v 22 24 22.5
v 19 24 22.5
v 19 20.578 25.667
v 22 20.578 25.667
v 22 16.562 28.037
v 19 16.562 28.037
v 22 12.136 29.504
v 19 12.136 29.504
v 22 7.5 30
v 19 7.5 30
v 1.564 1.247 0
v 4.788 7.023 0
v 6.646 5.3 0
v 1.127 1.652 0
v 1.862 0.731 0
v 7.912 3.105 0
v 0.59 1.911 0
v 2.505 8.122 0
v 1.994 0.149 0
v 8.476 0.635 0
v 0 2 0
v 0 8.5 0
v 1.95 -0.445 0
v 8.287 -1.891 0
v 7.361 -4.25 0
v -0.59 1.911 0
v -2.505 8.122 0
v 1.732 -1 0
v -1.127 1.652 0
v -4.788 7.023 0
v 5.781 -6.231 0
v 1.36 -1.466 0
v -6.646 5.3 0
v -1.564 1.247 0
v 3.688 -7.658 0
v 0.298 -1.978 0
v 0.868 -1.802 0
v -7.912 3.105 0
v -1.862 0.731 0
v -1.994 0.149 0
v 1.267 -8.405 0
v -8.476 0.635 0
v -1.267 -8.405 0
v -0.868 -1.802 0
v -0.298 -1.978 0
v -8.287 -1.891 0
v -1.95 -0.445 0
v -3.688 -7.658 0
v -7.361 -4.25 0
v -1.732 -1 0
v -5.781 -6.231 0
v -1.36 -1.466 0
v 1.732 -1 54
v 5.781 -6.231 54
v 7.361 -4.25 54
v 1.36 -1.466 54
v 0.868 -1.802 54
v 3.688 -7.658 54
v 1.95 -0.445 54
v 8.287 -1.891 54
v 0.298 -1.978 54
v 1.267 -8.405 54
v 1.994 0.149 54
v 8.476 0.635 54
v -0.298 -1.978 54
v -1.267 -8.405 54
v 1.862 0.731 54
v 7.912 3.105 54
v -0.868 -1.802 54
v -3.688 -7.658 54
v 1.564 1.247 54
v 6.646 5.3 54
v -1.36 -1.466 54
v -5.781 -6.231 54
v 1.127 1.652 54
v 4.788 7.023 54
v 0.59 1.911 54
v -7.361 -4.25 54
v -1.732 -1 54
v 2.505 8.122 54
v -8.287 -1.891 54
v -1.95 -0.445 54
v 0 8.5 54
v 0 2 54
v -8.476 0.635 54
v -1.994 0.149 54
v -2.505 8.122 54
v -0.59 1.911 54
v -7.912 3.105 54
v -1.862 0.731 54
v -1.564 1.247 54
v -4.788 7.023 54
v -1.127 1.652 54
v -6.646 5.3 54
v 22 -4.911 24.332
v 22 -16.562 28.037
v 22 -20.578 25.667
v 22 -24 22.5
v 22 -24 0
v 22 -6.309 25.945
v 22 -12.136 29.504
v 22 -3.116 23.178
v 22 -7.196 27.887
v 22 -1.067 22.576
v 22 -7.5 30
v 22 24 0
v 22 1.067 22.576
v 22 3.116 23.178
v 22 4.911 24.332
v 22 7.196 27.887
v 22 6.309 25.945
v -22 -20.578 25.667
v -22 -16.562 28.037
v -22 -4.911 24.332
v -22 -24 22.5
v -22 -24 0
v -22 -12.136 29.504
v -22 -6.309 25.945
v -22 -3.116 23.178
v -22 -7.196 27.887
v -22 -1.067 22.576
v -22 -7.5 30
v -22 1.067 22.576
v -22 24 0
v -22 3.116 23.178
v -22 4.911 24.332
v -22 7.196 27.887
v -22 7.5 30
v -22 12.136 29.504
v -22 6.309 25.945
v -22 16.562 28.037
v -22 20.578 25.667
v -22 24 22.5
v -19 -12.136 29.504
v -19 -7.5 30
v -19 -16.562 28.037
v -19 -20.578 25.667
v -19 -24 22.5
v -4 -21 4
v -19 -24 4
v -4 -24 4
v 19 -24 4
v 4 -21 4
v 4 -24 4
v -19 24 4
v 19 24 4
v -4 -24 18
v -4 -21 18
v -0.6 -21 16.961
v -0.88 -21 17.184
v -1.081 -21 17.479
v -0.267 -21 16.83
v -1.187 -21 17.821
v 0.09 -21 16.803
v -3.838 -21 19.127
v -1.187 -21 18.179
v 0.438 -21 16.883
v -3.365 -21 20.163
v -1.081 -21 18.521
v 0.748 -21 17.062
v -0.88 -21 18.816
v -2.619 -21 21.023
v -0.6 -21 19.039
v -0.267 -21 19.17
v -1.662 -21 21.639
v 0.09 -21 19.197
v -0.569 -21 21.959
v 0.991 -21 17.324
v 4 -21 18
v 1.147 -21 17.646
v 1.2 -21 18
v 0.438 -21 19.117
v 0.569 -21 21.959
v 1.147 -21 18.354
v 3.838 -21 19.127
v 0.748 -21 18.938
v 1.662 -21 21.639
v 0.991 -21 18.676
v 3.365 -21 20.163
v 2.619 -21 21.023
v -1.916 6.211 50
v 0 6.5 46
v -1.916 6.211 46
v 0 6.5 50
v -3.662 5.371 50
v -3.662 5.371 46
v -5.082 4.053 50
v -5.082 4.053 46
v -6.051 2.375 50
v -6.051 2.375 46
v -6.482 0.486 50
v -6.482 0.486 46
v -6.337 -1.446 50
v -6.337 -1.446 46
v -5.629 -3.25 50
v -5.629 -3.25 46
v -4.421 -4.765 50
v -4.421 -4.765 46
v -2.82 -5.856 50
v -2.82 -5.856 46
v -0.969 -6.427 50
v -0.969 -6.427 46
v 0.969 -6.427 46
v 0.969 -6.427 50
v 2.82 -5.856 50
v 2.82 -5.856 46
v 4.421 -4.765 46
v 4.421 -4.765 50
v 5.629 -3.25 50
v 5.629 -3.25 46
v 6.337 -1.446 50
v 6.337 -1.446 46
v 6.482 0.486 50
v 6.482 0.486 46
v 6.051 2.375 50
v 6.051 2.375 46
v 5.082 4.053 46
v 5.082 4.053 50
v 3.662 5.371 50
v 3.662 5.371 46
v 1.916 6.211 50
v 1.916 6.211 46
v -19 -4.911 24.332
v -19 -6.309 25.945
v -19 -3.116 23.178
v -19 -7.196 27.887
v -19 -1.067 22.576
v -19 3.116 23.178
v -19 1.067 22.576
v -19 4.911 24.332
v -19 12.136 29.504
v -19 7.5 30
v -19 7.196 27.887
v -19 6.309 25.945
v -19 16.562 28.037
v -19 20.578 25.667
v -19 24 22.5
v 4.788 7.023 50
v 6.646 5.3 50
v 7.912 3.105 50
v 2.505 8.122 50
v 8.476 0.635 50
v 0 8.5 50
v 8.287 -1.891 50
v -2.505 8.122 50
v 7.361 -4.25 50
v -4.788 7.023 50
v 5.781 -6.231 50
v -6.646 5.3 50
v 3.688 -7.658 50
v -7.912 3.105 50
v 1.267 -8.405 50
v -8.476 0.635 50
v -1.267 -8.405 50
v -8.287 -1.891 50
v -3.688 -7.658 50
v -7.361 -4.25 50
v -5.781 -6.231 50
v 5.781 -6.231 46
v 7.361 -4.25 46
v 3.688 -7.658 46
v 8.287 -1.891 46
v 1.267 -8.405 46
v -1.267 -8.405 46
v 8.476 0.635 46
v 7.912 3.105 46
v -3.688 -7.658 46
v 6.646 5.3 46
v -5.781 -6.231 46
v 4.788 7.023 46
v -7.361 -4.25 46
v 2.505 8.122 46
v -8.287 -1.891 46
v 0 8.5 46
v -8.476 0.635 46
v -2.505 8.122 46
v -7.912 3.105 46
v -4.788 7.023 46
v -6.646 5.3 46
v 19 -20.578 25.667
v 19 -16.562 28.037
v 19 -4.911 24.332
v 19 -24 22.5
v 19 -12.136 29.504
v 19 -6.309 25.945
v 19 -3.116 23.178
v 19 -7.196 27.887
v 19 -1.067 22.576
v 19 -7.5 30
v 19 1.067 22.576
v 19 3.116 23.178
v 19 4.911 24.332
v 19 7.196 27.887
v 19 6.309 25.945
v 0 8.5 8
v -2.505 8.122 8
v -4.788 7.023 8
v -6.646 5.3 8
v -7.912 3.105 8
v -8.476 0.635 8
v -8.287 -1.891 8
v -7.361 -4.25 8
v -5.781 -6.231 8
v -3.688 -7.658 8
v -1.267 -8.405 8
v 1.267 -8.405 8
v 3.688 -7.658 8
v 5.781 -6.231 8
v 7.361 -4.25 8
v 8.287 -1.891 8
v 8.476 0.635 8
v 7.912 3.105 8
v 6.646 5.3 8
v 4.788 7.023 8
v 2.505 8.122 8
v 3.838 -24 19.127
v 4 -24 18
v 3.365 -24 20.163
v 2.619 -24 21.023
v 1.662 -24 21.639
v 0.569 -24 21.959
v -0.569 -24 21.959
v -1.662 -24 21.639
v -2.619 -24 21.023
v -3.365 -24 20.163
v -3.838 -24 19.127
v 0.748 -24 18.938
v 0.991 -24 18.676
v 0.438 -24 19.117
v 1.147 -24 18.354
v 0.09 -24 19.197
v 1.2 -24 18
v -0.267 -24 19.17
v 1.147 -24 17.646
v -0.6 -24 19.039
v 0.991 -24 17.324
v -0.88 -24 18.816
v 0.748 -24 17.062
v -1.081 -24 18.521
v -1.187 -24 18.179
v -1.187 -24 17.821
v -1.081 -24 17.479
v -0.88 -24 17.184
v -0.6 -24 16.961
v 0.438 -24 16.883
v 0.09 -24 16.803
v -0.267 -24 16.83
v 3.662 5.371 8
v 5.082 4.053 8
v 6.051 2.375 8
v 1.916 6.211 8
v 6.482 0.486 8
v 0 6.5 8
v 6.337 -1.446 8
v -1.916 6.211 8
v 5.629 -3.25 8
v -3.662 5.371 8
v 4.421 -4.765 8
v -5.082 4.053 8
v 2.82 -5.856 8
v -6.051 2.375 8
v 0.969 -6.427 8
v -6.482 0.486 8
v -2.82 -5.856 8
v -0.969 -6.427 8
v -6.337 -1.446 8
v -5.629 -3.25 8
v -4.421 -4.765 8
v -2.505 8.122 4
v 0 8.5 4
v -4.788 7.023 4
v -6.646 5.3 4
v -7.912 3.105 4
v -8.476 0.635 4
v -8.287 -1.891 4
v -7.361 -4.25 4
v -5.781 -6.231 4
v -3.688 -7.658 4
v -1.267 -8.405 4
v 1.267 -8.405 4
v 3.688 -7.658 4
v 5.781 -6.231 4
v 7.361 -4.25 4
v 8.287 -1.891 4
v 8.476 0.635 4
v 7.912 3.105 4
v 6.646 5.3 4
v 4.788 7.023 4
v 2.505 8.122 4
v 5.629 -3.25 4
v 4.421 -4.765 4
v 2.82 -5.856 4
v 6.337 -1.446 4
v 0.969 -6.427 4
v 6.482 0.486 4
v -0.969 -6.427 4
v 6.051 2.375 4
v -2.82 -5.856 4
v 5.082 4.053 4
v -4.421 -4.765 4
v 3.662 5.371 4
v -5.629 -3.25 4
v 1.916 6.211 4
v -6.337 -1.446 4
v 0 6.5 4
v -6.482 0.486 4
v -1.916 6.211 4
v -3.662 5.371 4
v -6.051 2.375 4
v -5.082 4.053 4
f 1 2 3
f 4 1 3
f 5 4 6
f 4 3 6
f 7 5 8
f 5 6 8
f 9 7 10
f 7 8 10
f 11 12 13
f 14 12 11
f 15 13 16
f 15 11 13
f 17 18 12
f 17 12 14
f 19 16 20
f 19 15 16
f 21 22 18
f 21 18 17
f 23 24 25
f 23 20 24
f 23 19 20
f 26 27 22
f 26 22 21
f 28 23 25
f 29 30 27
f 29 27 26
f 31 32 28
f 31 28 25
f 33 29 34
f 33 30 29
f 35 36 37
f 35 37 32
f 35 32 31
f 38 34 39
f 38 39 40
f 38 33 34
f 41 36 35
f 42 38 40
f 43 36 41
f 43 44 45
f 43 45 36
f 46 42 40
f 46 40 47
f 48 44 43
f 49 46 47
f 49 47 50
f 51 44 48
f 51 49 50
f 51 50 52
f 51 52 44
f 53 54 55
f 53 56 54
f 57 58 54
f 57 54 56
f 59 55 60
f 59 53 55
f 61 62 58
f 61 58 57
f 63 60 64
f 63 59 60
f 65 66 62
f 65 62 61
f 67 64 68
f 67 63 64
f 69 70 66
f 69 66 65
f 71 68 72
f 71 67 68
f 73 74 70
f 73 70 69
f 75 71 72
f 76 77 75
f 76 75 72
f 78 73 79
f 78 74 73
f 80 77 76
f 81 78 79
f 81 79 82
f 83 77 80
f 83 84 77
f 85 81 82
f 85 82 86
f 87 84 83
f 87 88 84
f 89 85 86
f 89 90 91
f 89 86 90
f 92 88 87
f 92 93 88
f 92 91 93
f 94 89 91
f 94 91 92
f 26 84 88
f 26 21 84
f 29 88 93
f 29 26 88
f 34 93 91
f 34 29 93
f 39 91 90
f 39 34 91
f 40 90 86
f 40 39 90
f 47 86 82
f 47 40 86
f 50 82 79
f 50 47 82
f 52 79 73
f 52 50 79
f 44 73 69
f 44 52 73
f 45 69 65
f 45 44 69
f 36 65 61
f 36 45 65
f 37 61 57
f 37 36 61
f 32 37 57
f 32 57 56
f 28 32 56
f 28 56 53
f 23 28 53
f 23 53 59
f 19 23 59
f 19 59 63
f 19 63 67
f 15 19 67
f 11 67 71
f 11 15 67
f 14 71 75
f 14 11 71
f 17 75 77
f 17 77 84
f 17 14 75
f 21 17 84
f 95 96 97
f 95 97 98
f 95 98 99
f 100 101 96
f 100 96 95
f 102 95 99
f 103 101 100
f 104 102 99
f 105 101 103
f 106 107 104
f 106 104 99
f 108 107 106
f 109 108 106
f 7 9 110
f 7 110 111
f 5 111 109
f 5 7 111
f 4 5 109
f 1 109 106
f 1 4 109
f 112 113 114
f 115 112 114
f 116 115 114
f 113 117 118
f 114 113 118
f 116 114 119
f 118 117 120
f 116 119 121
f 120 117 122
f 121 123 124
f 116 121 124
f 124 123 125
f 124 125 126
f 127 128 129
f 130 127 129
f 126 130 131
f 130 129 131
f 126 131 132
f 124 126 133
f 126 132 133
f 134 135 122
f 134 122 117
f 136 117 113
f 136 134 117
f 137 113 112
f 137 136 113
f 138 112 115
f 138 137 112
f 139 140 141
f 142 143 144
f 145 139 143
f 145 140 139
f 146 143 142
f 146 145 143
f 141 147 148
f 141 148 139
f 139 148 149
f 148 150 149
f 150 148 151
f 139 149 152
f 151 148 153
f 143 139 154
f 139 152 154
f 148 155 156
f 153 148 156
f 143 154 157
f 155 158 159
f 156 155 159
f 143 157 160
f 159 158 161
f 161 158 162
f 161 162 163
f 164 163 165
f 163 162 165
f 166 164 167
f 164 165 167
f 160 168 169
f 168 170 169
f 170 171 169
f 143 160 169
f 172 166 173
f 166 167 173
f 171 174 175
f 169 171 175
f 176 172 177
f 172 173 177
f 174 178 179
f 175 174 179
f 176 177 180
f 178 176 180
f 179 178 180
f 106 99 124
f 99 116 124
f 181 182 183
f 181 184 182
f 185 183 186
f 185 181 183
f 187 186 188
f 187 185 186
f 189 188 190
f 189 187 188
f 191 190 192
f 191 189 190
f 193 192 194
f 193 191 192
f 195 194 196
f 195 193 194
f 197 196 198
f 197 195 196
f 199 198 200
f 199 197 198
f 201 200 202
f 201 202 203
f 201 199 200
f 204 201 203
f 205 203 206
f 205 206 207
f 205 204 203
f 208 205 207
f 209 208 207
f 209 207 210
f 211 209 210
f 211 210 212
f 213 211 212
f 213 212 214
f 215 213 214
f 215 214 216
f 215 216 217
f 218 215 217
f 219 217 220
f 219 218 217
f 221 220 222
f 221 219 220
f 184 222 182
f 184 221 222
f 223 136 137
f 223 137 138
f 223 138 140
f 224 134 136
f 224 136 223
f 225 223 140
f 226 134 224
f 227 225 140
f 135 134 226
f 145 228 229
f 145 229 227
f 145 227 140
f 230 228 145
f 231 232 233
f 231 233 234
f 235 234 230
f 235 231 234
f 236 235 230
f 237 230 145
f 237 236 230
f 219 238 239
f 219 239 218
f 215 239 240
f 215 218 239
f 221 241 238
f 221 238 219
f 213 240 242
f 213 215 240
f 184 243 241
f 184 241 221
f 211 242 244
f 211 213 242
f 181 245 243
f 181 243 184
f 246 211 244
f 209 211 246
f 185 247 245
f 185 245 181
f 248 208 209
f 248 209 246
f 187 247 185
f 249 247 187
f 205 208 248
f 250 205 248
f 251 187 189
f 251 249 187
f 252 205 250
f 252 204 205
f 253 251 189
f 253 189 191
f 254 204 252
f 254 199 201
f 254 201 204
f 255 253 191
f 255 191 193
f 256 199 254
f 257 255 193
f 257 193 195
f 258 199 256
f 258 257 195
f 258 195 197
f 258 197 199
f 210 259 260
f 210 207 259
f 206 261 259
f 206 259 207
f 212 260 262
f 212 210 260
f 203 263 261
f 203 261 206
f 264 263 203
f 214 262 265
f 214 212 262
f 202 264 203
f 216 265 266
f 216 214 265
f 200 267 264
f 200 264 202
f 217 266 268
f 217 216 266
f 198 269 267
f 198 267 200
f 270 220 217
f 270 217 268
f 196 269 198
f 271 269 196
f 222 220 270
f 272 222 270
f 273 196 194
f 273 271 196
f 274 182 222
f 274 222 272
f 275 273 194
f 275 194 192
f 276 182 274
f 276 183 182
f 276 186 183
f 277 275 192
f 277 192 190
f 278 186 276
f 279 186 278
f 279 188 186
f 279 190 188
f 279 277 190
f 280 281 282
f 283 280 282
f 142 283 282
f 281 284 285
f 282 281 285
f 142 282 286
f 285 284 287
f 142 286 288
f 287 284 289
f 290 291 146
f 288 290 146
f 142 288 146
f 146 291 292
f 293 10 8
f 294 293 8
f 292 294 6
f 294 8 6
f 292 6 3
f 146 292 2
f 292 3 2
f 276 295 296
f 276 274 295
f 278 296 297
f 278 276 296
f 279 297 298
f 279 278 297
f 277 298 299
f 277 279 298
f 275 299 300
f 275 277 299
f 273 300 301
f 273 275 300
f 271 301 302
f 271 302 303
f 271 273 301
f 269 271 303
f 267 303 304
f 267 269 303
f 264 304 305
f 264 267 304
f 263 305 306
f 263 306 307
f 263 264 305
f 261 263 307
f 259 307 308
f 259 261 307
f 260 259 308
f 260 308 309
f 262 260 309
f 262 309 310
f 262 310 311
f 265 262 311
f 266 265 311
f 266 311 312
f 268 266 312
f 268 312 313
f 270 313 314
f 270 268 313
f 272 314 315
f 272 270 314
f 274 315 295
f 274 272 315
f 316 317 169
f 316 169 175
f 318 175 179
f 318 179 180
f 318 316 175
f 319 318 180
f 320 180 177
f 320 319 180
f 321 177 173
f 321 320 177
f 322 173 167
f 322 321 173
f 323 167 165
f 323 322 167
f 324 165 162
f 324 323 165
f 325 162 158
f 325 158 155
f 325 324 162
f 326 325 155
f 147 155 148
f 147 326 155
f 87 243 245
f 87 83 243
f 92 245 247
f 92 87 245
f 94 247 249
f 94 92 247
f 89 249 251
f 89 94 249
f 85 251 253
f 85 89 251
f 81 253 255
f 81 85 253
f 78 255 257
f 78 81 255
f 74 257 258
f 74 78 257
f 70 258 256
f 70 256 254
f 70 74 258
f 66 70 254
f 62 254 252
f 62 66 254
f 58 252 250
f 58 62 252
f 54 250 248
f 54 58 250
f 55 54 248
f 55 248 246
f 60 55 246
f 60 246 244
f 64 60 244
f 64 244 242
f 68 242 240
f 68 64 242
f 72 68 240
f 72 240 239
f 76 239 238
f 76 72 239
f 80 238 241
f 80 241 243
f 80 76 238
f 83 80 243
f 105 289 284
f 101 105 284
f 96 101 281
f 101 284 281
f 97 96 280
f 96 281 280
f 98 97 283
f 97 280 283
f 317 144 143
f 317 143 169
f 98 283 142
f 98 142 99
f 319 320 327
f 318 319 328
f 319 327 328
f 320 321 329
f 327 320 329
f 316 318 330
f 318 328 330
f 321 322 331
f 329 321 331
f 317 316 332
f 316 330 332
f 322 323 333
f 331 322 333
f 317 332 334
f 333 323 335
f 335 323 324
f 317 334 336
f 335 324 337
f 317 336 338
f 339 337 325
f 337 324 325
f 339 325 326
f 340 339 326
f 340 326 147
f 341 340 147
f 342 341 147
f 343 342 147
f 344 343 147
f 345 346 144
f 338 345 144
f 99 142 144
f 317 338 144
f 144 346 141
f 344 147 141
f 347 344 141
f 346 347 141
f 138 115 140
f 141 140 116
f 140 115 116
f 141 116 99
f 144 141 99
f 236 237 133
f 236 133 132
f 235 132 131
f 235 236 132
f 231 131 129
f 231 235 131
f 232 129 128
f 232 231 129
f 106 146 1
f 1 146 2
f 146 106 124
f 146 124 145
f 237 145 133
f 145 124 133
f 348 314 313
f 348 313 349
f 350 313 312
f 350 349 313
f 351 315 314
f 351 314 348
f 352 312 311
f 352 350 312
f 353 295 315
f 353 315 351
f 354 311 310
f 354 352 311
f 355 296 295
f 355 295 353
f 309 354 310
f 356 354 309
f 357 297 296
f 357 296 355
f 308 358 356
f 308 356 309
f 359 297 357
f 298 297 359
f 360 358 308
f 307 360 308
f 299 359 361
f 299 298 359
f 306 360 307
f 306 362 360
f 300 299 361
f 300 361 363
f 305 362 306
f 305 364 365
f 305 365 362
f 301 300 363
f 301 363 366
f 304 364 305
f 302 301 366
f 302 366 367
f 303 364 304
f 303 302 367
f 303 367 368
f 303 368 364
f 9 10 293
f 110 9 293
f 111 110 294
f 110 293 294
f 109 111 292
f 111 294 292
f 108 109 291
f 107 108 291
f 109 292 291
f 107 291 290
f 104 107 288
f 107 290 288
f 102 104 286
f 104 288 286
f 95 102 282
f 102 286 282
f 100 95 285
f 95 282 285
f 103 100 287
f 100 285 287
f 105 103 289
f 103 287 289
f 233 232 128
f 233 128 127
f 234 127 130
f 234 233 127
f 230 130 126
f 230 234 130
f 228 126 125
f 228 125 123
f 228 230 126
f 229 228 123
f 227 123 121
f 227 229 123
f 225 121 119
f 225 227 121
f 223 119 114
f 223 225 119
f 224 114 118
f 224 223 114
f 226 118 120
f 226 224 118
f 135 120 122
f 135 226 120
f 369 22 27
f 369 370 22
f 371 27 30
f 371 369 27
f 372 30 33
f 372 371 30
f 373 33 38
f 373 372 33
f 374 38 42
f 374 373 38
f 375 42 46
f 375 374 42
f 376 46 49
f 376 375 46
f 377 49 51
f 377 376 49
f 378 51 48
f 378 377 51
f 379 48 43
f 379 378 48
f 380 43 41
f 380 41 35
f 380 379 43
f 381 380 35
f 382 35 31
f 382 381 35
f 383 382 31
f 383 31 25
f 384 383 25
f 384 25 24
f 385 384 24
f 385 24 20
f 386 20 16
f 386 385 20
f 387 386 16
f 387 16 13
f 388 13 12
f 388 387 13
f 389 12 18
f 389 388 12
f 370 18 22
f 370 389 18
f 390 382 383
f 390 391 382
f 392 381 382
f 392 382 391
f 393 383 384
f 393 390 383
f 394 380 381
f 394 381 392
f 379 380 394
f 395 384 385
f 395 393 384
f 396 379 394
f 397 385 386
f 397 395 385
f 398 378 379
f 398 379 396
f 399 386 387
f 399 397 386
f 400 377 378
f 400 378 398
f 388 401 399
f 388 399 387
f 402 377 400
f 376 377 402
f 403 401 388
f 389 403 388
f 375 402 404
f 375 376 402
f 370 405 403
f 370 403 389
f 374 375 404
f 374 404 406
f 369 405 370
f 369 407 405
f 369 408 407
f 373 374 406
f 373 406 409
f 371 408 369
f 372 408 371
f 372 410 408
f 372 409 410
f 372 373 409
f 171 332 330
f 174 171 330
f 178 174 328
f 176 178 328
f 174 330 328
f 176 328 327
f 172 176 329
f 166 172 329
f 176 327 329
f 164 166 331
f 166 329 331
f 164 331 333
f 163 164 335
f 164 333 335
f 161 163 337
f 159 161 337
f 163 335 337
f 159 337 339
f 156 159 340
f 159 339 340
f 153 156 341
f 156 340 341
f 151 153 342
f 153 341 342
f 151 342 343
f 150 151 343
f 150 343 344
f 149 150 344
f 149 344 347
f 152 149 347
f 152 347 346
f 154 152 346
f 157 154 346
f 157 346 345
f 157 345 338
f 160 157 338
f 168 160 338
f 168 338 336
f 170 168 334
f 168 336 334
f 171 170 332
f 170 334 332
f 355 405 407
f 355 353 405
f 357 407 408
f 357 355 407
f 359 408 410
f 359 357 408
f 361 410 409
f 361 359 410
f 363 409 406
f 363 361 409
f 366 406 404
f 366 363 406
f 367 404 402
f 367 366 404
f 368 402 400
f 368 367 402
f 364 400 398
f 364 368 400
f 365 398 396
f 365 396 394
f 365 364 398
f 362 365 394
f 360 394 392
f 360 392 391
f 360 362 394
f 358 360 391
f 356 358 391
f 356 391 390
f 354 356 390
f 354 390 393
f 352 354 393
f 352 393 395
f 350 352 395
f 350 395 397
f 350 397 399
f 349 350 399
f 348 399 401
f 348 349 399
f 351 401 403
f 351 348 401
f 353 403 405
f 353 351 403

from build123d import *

# Parameters (mm, degrees)
F5_W      = 38
F5_H      = 48
F6_DEPTH  = 4
F9_DEPTH  = 3
F12_R     = 1.2
F13_DEPTH = 3


with BuildPart() as f2:
    # F1 (on Right) → F2 (revolve)
    with BuildSketch(Plane.YZ):
        Polygon((2, 54), (2, 0), (8.5, 0), (8.5, 4), (6.5, 4), (6.5, 8), (8.5, 8), (8.5, 46), (6.5, 46), (6.5, 50), (8.5, 50), (8.5, 54), align=None)
    revolve(axis=Axis((0, 0, 6.5396283753), (0, 0, 1)))


with BuildPart() as f6:
    # F5 (on Top) → F6 (new body)
    with BuildSketch(Plane.XY):
        Rectangle(F5_W, F5_H)
    extrude(amount=F6_DEPTH)



with BuildPart() as f9:
    # F8 (on face) → F9 (new body)
    with BuildSketch(Plane.YZ.offset(-19)):
        with BuildLine():
            ThreePointArc((0, 22.5), (-5.3033008589, 24.6966991411), (-7.5, 30))
            ThreePointArc((-7.5, 30), (-16.5622844802, 28.0370258564), (-24, 22.5))
            Line((-24, 22.5), (-24, 0))
            Line((-24, 0), (0, 0))
            Line((0, 0), (0, 22.5))
        make_face()
        with BuildLine():
            ThreePointArc((7.5, 30), (5.3033008589, 24.6966991411), (0, 22.5))
            Line((0, 22.5), (0, 0))
            Line((0, 0), (24, 0))
            Line((24, 0), (24, 22.5))
            ThreePointArc((24, 22.5), (16.5622844802, 28.0370258564), (7.5, 30))
        make_face()
    extrude(amount=-F9_DEPTH)


with BuildPart() as f6_1:
    add(f6.part)

    add(f9.part)  # F10 merges F9
    # F10: F9 across plane
    add(f9.part.mirror(Plane.YZ))

    # F12 (on face) → F13 (join)
    with BuildSketch(Plane.XZ.offset(24)):
        with BuildLine():
            Line((-4, 18), (-4, 4))
            Line((-4, 4), (4, 4))
            Line((4, 4), (4, 18))
            ThreePointArc((4, 18), (0, 22), (-4, 18))
        make_face()
        with Locations((0, 18)):
            Circle(F12_R, mode=Mode.SUBTRACT)
    extrude(amount=-F13_DEPTH)


solid = Compound([f2.part, f6_1.part])
